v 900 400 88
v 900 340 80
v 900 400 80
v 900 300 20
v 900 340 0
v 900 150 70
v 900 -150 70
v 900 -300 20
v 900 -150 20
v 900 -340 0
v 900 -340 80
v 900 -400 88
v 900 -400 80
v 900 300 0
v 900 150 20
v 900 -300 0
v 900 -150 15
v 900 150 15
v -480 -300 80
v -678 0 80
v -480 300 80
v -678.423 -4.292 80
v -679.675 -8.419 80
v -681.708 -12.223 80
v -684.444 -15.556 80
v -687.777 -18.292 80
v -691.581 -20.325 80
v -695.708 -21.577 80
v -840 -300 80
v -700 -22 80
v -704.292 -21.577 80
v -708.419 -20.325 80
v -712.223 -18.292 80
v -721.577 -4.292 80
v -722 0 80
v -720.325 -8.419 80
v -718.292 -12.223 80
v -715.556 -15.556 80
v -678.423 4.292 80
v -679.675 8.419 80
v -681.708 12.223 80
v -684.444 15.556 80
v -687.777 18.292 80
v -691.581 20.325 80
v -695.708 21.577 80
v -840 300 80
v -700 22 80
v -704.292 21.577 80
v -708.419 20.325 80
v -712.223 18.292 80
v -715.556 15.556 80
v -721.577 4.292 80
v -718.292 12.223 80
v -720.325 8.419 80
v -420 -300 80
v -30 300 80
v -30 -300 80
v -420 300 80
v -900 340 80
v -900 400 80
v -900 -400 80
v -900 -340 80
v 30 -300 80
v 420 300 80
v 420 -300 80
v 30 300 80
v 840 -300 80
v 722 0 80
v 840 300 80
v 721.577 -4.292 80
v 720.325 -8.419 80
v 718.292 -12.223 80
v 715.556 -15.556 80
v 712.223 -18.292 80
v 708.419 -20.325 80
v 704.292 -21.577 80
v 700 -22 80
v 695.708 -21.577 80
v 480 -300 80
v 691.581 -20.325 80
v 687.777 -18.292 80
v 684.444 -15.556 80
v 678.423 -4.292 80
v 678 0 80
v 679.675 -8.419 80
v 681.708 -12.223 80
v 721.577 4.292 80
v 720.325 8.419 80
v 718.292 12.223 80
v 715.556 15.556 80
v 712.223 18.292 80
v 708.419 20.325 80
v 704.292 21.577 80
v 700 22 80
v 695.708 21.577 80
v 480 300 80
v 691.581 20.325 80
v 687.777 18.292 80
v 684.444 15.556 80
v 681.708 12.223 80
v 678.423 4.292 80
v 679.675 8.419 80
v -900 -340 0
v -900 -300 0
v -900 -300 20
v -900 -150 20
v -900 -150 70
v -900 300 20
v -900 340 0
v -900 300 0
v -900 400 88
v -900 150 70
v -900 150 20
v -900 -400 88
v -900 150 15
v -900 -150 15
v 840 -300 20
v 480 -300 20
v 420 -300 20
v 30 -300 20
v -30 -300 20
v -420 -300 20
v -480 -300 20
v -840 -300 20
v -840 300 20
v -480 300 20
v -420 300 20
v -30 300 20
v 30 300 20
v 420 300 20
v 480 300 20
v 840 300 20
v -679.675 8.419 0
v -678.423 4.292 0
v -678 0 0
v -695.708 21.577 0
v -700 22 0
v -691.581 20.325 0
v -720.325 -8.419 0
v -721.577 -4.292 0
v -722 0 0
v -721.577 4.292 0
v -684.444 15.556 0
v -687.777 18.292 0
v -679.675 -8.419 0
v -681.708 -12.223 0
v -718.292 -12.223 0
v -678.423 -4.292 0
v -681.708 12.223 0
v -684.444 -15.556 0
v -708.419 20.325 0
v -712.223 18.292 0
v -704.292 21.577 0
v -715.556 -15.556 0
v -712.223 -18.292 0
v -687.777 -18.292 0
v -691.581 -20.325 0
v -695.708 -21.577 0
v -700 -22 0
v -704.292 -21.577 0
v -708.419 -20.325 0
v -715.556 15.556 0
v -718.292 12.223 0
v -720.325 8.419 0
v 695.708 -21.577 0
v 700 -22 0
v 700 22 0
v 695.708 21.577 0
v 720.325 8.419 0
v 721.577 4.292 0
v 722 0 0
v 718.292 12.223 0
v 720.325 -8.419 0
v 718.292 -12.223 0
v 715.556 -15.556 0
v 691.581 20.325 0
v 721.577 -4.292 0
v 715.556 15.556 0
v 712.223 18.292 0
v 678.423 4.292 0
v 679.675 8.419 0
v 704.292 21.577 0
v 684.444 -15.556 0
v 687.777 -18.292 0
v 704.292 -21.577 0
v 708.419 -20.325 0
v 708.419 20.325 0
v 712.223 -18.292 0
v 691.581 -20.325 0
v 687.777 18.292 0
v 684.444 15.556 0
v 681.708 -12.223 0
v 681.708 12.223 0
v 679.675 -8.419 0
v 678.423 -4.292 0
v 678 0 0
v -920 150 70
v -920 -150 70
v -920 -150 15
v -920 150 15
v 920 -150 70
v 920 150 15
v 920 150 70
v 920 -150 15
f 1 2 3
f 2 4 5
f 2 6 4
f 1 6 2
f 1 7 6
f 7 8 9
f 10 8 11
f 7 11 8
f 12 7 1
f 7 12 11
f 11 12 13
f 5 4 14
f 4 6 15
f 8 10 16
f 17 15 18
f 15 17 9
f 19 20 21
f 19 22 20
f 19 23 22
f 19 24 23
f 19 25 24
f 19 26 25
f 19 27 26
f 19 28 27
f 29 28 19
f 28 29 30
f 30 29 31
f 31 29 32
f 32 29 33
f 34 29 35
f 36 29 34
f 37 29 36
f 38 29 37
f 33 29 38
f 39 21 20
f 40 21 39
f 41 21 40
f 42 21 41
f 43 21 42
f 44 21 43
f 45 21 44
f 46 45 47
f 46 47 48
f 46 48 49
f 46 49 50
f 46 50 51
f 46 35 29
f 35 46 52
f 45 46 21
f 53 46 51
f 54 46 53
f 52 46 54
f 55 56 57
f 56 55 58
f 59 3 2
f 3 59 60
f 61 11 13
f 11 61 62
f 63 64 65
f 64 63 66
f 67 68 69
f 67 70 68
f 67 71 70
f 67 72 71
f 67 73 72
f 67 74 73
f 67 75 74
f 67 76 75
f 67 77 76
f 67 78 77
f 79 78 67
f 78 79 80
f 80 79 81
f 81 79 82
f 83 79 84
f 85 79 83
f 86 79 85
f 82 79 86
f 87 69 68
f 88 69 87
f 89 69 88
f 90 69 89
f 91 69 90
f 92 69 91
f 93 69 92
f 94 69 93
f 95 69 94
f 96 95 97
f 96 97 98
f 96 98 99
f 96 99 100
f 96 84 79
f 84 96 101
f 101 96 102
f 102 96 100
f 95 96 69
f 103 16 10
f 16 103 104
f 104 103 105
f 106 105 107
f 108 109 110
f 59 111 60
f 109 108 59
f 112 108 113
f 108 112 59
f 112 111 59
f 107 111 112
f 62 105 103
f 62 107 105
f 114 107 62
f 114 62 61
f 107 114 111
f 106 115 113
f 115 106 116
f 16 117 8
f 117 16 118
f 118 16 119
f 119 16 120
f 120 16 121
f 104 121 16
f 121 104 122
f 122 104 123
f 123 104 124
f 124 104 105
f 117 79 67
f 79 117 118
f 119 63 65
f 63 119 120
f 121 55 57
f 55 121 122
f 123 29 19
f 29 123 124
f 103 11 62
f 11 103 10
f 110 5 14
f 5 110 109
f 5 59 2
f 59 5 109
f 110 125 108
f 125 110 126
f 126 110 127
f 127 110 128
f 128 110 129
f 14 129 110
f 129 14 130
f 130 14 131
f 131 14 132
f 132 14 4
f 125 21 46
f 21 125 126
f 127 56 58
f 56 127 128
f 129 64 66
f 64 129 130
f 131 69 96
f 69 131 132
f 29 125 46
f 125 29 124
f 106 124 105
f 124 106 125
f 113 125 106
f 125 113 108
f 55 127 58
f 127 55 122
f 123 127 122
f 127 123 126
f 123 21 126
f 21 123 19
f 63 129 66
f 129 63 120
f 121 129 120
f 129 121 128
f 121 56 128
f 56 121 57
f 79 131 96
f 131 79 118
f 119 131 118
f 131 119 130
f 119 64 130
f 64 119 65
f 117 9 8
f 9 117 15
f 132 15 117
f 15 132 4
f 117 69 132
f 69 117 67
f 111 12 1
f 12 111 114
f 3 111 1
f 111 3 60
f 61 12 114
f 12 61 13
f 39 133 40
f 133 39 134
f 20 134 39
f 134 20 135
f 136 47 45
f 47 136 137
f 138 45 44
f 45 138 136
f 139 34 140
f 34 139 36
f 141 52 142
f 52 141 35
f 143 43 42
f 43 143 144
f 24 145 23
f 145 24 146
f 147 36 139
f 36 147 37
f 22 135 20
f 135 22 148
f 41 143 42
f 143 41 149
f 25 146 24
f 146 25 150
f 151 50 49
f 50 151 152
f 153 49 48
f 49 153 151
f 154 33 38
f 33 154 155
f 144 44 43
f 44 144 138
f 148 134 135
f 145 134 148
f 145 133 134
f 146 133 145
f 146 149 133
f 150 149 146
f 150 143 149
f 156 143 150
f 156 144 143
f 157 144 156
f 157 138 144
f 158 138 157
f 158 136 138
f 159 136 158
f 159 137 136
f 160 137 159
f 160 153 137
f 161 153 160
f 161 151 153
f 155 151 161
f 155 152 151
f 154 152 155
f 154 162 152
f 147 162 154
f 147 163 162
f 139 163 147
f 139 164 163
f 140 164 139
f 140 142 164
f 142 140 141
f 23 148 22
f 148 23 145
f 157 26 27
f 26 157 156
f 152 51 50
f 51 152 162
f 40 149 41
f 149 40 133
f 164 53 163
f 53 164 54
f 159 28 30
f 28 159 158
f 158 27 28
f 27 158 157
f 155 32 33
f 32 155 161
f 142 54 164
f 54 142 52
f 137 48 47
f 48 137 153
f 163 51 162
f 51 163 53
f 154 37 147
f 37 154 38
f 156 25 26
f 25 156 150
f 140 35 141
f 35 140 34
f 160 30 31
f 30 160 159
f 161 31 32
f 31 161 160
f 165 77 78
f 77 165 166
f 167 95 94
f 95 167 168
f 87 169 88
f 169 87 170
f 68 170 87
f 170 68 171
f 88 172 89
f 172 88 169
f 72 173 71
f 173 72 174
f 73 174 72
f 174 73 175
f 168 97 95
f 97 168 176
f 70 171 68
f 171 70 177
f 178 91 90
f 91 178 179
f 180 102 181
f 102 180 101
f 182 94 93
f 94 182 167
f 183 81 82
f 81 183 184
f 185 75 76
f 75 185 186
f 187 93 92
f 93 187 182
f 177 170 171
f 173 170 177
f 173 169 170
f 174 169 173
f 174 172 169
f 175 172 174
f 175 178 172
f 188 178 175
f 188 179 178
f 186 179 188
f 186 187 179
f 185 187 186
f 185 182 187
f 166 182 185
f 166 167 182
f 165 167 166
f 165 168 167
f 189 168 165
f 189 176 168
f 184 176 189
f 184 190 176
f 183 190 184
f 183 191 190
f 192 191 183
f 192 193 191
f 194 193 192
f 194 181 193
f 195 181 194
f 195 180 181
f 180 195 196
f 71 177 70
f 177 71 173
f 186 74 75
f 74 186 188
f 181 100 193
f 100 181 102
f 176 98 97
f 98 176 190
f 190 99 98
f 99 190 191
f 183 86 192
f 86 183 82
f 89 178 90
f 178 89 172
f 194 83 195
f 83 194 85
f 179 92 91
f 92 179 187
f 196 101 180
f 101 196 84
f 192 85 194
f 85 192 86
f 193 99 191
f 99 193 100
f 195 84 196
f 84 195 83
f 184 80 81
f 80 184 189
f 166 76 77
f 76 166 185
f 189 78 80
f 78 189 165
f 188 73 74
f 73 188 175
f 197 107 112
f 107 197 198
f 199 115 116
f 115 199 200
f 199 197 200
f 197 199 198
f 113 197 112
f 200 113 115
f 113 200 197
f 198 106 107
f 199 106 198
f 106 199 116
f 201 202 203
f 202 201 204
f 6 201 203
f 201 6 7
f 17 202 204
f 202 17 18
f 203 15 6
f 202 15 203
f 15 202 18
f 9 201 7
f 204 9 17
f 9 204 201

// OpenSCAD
// carrier - generated by asm_3d.py from out/assembly/assembly_specs.json (F4.4) - units mm
// DESIGN - check and release before manufacture. z up, conveyor top z = 500.

module carrier() {
  translate([-900.00, -340.00, 0.00]) cube([1800.00, 40.00, 80.00]);
  translate([-900.00, 300.00, 0.00]) cube([1800.00, 40.00, 80.00]);
  translate([-900.00, -300.00, 20.00]) cube([60.00, 600.00, 60.00]);
  translate([-480.00, -300.00, 20.00]) cube([60.00, 600.00, 60.00]);
  translate([-30.00, -300.00, 20.00]) cube([60.00, 600.00, 60.00]);
  translate([420.00, -300.00, 20.00]) cube([60.00, 600.00, 60.00]);
  translate([840.00, -300.00, 20.00]) cube([60.00, 600.00, 60.00]);
  translate([-900.00, -400.00, 80.00]) cube([1800.00, 800.00, 8.00]);
  translate([-700.00, 0.00, 40.00]) rotate([0, 0, 0]) cylinder(r = 22.00, h = 80.00, center = true, $fn = 32);
  translate([700.00, 0.00, 40.00]) rotate([0, 0, 0]) cylinder(r = 22.00, h = 80.00, center = true, $fn = 32);
  translate([-920.00, -150.00, 15.00]) cube([20.00, 300.00, 55.00]);
  translate([900.00, -150.00, 15.00]) cube([20.00, 300.00, 55.00]);
}
carrier();
